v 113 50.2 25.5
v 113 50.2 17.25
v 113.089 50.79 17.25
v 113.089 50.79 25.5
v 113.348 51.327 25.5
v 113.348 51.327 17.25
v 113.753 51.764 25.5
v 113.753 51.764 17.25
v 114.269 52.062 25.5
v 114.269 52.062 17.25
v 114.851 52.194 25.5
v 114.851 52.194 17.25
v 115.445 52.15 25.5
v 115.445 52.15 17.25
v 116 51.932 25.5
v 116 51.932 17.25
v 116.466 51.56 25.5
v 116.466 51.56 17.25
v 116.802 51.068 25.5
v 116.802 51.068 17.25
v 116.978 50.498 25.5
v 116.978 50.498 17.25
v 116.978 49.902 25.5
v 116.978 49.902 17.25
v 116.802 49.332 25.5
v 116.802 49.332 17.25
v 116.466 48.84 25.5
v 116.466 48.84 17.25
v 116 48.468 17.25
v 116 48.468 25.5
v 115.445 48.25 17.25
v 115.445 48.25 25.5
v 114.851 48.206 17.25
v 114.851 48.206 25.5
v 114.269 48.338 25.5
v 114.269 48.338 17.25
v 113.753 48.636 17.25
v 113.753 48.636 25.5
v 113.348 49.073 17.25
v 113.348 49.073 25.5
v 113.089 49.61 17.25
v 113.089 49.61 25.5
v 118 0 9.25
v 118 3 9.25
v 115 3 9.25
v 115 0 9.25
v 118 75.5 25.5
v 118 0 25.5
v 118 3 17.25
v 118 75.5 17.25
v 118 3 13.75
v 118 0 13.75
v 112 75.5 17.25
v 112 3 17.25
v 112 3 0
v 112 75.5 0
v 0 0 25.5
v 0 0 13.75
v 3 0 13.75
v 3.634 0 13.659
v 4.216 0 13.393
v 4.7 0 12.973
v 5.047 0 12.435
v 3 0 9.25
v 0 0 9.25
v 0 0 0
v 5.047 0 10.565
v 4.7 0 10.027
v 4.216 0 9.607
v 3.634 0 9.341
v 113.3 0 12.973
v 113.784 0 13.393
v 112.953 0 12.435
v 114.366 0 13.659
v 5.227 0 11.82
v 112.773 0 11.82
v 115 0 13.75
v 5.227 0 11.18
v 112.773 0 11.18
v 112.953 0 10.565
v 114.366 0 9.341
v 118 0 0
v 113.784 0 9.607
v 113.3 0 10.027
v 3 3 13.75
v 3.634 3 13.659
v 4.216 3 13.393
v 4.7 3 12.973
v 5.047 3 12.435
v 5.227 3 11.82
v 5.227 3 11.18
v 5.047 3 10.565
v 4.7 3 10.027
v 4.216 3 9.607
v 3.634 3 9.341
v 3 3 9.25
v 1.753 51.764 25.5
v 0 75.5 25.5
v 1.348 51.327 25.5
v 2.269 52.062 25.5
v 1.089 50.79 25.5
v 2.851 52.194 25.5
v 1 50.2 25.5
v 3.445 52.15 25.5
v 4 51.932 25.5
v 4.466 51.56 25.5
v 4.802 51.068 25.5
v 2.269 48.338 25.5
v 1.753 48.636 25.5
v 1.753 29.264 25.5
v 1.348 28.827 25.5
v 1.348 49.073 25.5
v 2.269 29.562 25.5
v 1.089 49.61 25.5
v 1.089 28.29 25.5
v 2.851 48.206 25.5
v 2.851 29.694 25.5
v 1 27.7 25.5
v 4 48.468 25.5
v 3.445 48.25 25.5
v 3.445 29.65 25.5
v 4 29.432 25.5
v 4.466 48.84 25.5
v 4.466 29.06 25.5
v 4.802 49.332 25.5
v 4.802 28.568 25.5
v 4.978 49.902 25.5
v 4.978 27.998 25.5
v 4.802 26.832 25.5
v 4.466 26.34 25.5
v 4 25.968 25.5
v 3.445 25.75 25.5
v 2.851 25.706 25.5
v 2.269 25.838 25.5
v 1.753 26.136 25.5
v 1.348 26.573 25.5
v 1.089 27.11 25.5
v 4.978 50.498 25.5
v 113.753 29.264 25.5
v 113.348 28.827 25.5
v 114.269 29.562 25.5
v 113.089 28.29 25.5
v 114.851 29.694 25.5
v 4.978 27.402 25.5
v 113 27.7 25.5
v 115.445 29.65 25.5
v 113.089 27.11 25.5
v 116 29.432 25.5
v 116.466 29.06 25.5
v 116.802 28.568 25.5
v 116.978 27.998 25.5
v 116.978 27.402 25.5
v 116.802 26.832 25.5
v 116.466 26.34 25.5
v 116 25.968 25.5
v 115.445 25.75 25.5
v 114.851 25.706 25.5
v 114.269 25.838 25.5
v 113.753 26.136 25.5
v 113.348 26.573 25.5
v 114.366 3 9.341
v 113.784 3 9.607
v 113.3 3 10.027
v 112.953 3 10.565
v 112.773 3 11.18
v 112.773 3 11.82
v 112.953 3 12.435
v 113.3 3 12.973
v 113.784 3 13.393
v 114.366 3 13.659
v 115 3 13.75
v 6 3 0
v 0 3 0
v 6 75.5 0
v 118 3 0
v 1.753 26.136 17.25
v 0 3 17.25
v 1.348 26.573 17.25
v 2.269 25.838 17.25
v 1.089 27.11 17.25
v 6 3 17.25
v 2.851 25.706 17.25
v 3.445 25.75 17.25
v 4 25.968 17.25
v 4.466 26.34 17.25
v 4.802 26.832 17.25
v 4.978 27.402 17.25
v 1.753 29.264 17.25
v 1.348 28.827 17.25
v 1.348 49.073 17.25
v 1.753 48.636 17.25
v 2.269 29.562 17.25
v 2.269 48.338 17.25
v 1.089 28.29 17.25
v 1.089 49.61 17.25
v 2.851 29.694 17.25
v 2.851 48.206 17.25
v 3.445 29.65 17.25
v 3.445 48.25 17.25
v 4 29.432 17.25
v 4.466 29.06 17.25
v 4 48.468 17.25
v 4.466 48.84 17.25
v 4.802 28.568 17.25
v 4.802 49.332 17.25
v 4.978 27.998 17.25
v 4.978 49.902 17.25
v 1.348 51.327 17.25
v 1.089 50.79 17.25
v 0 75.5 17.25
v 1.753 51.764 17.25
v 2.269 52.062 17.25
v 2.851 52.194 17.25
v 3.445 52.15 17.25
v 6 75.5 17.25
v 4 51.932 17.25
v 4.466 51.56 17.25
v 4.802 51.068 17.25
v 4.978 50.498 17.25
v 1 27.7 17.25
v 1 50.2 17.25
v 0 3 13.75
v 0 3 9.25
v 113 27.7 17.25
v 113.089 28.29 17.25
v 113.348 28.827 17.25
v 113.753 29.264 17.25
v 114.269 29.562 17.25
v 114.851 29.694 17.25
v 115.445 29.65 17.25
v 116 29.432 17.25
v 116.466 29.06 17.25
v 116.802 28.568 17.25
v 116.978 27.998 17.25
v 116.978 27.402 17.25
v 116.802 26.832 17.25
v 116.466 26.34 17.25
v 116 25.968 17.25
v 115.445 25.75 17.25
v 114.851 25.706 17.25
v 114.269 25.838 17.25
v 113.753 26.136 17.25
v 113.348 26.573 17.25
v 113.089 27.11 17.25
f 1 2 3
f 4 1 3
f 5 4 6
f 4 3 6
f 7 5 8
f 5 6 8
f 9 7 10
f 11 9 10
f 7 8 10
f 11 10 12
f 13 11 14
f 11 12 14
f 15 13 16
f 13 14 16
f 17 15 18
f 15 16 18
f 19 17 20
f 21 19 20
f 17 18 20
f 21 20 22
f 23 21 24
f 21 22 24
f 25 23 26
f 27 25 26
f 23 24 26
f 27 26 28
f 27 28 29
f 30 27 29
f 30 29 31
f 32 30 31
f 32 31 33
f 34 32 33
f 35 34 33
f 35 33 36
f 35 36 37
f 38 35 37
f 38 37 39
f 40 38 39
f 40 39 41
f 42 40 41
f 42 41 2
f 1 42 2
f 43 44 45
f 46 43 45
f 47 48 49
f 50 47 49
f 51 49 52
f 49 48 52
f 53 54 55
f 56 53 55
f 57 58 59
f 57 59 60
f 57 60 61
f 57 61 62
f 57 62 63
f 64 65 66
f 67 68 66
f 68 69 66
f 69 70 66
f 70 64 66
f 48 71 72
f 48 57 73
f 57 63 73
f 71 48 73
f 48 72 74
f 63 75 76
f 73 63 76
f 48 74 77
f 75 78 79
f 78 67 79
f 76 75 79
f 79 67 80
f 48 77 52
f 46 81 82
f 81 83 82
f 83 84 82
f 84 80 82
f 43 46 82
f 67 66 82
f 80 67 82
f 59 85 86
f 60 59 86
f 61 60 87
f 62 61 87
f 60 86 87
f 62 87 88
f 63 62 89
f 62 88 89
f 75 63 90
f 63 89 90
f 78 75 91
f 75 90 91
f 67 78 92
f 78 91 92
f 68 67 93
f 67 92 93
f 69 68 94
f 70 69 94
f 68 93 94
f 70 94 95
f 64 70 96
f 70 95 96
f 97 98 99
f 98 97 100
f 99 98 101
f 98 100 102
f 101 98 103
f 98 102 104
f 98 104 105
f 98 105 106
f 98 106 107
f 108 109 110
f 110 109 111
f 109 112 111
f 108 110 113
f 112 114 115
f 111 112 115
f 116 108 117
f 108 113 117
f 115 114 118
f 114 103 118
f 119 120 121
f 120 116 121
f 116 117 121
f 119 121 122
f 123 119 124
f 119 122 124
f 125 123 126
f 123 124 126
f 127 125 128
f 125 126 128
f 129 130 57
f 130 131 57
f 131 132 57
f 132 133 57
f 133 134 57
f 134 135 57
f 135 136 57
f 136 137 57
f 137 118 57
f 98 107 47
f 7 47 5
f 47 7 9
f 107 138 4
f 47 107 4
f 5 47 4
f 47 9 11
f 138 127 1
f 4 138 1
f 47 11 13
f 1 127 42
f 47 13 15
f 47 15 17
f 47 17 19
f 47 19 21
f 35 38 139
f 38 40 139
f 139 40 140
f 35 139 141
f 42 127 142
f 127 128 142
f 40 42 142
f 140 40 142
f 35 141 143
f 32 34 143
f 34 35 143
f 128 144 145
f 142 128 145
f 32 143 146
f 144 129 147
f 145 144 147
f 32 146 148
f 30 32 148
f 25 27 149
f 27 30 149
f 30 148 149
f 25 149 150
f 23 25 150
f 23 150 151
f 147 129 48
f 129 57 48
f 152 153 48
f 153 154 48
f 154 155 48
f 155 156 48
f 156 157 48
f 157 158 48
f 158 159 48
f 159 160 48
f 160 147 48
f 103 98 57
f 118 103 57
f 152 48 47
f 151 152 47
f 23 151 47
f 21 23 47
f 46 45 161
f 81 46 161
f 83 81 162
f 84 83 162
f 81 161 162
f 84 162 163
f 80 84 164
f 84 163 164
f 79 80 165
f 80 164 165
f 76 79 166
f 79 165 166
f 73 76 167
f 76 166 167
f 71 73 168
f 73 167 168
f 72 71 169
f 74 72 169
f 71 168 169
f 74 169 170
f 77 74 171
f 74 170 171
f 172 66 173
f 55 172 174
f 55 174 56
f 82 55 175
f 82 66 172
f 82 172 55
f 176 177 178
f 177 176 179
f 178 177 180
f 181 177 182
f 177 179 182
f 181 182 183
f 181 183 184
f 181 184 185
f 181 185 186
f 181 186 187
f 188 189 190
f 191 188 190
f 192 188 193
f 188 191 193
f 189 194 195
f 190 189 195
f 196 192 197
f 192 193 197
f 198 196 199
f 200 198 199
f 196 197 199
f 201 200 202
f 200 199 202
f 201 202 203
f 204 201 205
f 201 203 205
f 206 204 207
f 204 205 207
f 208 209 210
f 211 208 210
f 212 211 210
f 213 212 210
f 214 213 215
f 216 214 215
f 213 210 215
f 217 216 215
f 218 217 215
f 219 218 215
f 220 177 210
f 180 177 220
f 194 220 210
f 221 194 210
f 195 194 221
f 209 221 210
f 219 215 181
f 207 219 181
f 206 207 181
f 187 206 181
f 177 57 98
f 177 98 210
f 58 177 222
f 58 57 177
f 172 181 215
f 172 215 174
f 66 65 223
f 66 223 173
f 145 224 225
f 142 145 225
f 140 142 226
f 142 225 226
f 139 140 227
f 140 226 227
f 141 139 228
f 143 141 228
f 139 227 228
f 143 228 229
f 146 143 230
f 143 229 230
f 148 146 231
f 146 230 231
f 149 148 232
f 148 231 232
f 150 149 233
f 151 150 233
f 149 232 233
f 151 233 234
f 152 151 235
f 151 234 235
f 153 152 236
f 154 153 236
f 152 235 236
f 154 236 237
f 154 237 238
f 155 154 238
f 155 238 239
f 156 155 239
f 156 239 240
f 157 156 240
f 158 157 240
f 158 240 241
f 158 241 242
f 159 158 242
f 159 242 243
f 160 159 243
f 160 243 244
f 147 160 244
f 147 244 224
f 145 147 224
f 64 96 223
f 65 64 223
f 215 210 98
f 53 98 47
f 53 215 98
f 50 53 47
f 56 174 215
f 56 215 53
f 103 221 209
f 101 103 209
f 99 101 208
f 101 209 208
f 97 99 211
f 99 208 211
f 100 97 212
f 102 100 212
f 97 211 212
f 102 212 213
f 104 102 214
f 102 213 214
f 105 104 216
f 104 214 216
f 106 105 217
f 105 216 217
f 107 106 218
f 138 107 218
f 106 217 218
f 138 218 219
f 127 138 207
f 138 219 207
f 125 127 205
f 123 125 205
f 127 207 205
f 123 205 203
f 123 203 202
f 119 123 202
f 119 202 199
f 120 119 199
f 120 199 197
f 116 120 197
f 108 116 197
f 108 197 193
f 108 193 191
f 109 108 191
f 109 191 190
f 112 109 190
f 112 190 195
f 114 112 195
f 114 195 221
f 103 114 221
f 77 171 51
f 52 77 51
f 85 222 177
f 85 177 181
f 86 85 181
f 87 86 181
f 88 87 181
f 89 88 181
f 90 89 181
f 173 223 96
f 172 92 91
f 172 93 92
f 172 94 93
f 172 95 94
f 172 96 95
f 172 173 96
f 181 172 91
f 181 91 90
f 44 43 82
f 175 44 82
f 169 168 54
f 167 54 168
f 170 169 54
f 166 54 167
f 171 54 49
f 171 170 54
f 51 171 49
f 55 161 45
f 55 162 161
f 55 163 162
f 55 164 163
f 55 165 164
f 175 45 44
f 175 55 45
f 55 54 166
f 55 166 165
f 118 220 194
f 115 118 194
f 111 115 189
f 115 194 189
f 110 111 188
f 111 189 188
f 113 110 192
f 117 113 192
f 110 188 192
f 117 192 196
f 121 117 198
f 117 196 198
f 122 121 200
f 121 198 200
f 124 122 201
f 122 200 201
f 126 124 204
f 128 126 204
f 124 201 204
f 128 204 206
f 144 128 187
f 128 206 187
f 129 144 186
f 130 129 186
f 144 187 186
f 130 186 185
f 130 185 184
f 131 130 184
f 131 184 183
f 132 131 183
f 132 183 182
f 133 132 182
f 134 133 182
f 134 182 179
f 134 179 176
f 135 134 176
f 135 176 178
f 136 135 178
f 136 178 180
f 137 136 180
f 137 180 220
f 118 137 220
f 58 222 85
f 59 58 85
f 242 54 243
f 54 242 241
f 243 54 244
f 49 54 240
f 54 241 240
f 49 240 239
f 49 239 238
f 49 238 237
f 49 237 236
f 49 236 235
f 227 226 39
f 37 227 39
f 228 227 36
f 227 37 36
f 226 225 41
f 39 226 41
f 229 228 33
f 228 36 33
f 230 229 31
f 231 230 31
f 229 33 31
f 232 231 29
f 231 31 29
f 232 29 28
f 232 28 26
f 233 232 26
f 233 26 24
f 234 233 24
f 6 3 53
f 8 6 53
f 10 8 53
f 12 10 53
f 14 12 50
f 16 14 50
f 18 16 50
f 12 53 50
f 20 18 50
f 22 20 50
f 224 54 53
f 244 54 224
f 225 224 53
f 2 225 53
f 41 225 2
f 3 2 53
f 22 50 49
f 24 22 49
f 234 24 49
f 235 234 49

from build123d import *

# Parameters (mm, degrees)
SKETCH_1_W          = 118
SKETCH_1_H          = 25.5
EXTRUDE_1_DEPTH     = 75.5
SKETCH_2_W          = 6
SKETCH_2_H          = 17.25
CUT_EXTRUDE_1_DEPTH = 72.5
CUT_EXTRUDE_2_DEPTH = 141.820808122
SKETCH_4_R          = 2
CUT_EXTRUDE_3_DEPTH = 142.144650979


with BuildPart() as part:
    # 草图1 → 凸台-拉伸1 (new body)
    with BuildSketch(Plane(origin=(0, 0, 0), x_dir=(1, 0, 0), z_dir=(0, 1, 0))):
        with Locations((59, -12.75)):
            Rectangle(SKETCH_1_W, SKETCH_1_H)
    extrude(amount=EXTRUDE_1_DEPTH)

    # 草图2 → 切除-拉伸1 (cut)
    with BuildSketch(Plane(origin=(0, 75.5, 0), x_dir=(1, 0, 0), z_dir=(0, 1, 0))):
        with Locations((3, -8.625)):
            Rectangle(SKETCH_2_W, SKETCH_2_H)
        with Locations((115, -8.625)):
            Rectangle(SKETCH_2_W, SKETCH_2_H)
    extrude(amount=-CUT_EXTRUDE_1_DEPTH, mode=Mode.SUBTRACT)

    # 草图3 → 切除-拉伸2 (cut, through all)
    with BuildSketch(Plane(origin=(0, 3, 0), x_dir=(1, 0, 0), z_dir=(0, 1, 0))):
        with BuildLine():
            Line((0, -13.75), (3, -13.75))
            ThreePointArc((3, -13.75), (5.25, -11.5), (3, -9.25))
            Line((3, -9.25), (0, -9.25))
            Line((0, -9.25), (0, -13.75))
        make_face()
        with BuildLine():
            Line((118, -13.75), (118, -9.25))
            Line((118, -9.25), (115, -9.25))
            ThreePointArc((115, -9.25), (112.75, -11.5), (115, -13.75))
            Line((115, -13.75), (118, -13.75))
        make_face()
    extrude(amount=-CUT_EXTRUDE_2_DEPTH, mode=Mode.SUBTRACT)

    # 草图4 → 切除-拉伸3 (cut, through all)
    with BuildSketch(Plane(origin=(0, 0, 17.25), x_dir=(-1, 0, 0), z_dir=(0, 0, -1))):
        with Locations((-115, 50.2)):
            Circle(SKETCH_4_R)
        with Locations((-115, 27.7)):
            Circle(SKETCH_4_R)
        with Locations((-3, 50.2)):
            Circle(SKETCH_4_R)
        with Locations((-3, 27.7)):
            Circle(SKETCH_4_R)
    extrude(amount=-CUT_EXTRUDE_3_DEPTH, mode=Mode.SUBTRACT)


solid = part.part
